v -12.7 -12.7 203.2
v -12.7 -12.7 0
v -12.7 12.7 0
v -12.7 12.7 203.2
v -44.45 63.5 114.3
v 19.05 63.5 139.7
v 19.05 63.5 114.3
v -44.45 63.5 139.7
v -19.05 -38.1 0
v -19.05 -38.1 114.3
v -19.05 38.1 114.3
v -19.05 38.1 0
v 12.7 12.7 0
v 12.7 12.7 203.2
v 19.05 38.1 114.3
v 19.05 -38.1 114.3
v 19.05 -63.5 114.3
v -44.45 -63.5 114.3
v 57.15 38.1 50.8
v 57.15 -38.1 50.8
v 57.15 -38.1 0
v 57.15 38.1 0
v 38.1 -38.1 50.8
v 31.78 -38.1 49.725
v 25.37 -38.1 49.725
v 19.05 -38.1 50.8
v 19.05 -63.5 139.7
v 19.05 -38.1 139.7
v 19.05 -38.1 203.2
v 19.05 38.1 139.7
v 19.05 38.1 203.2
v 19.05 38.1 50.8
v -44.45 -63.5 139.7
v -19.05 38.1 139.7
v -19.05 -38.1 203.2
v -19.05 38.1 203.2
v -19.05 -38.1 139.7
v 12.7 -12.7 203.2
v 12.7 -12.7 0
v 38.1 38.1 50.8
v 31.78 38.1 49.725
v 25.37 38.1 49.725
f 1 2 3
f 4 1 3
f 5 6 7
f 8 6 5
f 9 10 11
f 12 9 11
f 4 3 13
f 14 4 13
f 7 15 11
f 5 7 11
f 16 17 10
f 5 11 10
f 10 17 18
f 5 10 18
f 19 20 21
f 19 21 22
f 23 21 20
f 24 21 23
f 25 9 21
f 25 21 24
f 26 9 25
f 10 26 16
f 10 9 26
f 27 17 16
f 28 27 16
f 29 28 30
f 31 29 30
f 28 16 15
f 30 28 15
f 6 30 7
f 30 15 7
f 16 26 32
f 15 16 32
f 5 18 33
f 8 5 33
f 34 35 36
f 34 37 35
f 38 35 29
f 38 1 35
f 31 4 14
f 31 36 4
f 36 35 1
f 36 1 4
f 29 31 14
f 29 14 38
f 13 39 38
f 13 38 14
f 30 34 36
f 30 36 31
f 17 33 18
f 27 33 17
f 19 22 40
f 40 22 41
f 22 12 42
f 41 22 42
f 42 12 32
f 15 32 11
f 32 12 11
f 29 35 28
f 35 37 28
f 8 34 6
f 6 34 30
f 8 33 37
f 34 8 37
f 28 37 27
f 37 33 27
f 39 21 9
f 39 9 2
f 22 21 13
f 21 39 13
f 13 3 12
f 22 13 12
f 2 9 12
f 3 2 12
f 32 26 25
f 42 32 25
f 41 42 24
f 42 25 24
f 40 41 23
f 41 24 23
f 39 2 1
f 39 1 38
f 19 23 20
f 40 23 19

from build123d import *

# Parameters (mm, degrees)
F0_W      = 38.1
F0_H      = 76.2
F1_DEPTH  = 177.8
F2_W      = 76.2
F2_H      = 25.4
F3_DEPTH  = 25.4
F5_DEPTH  = 25.4
F7_DEPTH  = 25.4
F8_W      = 38.1
F8_H      = 76.2
F9_DEPTH  = 25.4
F10_W     = 25.4
F10_H     = 25.4
F11_DEPTH = 228.6
F12_W     = 76.2
F12_H     = 50.8
F13_DEPTH = 38.1
F15_DEPTH = 228.6


with BuildPart() as f1:
    # F0 (on Top) → F1 (new body)
    with BuildSketch(Plane.XY):
        Rectangle(F0_W, F0_H)
    extrude(amount=F1_DEPTH)

    # F2 (on face) → F3 (join)
    with BuildSketch(Plane(origin=(-19.05, 0, 0), x_dir=(0, -1, 0), z_dir=(-1, 0, 0))):
        with Locations((0, 127)):
            Rectangle(F2_W, F2_H)
    extrude(amount=F3_DEPTH)

    # F4 (on face) → F5 (join)
    with BuildSketch(Plane.XZ.offset(38.1)):
        Polygon((-44.45, 139.7), (-44.45, 114.3), (-19.05, 114.3), (19.05, 114.3), (19.05, 139.7), (-19.05, 139.7), align=None)
    extrude(amount=F5_DEPTH)

    # F6 (on face) → F7 (join)
    with BuildSketch(Plane(origin=(0, 38.1, 0), x_dir=(-1, 0, 0), z_dir=(0, 1, 0))):
        Polygon((44.45, 114.3), (44.45, 139.7), (19.05, 139.7), (-19.05, 139.7), (-19.05, 114.3), (19.05, 114.3), align=None)
    extrude(amount=F7_DEPTH)

    # F8 (on face) → F9 (join)
    with BuildSketch(Plane.XY.offset(177.8)):
        Rectangle(F8_W, F8_H)
    extrude(amount=F9_DEPTH)

    # F10 (on face) → F11 (cut)
    with BuildSketch(Plane.XY.offset(203.2)):
        Rectangle(F10_W, F10_H)
    extrude(amount=-F11_DEPTH, mode=Mode.SUBTRACT)

    # F12 (on face) → F13 (join)
    with BuildSketch(Plane.YZ.offset(19.05)):
        with Locations((0, 25.4)):
            Rectangle(F12_W, F12_H)
    extrude(amount=F13_DEPTH)

    # F14 (on face) → F15 (cut)
    with BuildSketch(Plane.XZ.offset(38.1)):
        with BuildLine():
            Line((38.1, 50.8), (19.05, 50.8))
            ThreePointArc((19.05, 50.8), (28.575, 49.590166), (38.1, 50.8))
        make_face()
    extrude(amount=-F15_DEPTH, mode=Mode.SUBTRACT)


solid = f1.part
